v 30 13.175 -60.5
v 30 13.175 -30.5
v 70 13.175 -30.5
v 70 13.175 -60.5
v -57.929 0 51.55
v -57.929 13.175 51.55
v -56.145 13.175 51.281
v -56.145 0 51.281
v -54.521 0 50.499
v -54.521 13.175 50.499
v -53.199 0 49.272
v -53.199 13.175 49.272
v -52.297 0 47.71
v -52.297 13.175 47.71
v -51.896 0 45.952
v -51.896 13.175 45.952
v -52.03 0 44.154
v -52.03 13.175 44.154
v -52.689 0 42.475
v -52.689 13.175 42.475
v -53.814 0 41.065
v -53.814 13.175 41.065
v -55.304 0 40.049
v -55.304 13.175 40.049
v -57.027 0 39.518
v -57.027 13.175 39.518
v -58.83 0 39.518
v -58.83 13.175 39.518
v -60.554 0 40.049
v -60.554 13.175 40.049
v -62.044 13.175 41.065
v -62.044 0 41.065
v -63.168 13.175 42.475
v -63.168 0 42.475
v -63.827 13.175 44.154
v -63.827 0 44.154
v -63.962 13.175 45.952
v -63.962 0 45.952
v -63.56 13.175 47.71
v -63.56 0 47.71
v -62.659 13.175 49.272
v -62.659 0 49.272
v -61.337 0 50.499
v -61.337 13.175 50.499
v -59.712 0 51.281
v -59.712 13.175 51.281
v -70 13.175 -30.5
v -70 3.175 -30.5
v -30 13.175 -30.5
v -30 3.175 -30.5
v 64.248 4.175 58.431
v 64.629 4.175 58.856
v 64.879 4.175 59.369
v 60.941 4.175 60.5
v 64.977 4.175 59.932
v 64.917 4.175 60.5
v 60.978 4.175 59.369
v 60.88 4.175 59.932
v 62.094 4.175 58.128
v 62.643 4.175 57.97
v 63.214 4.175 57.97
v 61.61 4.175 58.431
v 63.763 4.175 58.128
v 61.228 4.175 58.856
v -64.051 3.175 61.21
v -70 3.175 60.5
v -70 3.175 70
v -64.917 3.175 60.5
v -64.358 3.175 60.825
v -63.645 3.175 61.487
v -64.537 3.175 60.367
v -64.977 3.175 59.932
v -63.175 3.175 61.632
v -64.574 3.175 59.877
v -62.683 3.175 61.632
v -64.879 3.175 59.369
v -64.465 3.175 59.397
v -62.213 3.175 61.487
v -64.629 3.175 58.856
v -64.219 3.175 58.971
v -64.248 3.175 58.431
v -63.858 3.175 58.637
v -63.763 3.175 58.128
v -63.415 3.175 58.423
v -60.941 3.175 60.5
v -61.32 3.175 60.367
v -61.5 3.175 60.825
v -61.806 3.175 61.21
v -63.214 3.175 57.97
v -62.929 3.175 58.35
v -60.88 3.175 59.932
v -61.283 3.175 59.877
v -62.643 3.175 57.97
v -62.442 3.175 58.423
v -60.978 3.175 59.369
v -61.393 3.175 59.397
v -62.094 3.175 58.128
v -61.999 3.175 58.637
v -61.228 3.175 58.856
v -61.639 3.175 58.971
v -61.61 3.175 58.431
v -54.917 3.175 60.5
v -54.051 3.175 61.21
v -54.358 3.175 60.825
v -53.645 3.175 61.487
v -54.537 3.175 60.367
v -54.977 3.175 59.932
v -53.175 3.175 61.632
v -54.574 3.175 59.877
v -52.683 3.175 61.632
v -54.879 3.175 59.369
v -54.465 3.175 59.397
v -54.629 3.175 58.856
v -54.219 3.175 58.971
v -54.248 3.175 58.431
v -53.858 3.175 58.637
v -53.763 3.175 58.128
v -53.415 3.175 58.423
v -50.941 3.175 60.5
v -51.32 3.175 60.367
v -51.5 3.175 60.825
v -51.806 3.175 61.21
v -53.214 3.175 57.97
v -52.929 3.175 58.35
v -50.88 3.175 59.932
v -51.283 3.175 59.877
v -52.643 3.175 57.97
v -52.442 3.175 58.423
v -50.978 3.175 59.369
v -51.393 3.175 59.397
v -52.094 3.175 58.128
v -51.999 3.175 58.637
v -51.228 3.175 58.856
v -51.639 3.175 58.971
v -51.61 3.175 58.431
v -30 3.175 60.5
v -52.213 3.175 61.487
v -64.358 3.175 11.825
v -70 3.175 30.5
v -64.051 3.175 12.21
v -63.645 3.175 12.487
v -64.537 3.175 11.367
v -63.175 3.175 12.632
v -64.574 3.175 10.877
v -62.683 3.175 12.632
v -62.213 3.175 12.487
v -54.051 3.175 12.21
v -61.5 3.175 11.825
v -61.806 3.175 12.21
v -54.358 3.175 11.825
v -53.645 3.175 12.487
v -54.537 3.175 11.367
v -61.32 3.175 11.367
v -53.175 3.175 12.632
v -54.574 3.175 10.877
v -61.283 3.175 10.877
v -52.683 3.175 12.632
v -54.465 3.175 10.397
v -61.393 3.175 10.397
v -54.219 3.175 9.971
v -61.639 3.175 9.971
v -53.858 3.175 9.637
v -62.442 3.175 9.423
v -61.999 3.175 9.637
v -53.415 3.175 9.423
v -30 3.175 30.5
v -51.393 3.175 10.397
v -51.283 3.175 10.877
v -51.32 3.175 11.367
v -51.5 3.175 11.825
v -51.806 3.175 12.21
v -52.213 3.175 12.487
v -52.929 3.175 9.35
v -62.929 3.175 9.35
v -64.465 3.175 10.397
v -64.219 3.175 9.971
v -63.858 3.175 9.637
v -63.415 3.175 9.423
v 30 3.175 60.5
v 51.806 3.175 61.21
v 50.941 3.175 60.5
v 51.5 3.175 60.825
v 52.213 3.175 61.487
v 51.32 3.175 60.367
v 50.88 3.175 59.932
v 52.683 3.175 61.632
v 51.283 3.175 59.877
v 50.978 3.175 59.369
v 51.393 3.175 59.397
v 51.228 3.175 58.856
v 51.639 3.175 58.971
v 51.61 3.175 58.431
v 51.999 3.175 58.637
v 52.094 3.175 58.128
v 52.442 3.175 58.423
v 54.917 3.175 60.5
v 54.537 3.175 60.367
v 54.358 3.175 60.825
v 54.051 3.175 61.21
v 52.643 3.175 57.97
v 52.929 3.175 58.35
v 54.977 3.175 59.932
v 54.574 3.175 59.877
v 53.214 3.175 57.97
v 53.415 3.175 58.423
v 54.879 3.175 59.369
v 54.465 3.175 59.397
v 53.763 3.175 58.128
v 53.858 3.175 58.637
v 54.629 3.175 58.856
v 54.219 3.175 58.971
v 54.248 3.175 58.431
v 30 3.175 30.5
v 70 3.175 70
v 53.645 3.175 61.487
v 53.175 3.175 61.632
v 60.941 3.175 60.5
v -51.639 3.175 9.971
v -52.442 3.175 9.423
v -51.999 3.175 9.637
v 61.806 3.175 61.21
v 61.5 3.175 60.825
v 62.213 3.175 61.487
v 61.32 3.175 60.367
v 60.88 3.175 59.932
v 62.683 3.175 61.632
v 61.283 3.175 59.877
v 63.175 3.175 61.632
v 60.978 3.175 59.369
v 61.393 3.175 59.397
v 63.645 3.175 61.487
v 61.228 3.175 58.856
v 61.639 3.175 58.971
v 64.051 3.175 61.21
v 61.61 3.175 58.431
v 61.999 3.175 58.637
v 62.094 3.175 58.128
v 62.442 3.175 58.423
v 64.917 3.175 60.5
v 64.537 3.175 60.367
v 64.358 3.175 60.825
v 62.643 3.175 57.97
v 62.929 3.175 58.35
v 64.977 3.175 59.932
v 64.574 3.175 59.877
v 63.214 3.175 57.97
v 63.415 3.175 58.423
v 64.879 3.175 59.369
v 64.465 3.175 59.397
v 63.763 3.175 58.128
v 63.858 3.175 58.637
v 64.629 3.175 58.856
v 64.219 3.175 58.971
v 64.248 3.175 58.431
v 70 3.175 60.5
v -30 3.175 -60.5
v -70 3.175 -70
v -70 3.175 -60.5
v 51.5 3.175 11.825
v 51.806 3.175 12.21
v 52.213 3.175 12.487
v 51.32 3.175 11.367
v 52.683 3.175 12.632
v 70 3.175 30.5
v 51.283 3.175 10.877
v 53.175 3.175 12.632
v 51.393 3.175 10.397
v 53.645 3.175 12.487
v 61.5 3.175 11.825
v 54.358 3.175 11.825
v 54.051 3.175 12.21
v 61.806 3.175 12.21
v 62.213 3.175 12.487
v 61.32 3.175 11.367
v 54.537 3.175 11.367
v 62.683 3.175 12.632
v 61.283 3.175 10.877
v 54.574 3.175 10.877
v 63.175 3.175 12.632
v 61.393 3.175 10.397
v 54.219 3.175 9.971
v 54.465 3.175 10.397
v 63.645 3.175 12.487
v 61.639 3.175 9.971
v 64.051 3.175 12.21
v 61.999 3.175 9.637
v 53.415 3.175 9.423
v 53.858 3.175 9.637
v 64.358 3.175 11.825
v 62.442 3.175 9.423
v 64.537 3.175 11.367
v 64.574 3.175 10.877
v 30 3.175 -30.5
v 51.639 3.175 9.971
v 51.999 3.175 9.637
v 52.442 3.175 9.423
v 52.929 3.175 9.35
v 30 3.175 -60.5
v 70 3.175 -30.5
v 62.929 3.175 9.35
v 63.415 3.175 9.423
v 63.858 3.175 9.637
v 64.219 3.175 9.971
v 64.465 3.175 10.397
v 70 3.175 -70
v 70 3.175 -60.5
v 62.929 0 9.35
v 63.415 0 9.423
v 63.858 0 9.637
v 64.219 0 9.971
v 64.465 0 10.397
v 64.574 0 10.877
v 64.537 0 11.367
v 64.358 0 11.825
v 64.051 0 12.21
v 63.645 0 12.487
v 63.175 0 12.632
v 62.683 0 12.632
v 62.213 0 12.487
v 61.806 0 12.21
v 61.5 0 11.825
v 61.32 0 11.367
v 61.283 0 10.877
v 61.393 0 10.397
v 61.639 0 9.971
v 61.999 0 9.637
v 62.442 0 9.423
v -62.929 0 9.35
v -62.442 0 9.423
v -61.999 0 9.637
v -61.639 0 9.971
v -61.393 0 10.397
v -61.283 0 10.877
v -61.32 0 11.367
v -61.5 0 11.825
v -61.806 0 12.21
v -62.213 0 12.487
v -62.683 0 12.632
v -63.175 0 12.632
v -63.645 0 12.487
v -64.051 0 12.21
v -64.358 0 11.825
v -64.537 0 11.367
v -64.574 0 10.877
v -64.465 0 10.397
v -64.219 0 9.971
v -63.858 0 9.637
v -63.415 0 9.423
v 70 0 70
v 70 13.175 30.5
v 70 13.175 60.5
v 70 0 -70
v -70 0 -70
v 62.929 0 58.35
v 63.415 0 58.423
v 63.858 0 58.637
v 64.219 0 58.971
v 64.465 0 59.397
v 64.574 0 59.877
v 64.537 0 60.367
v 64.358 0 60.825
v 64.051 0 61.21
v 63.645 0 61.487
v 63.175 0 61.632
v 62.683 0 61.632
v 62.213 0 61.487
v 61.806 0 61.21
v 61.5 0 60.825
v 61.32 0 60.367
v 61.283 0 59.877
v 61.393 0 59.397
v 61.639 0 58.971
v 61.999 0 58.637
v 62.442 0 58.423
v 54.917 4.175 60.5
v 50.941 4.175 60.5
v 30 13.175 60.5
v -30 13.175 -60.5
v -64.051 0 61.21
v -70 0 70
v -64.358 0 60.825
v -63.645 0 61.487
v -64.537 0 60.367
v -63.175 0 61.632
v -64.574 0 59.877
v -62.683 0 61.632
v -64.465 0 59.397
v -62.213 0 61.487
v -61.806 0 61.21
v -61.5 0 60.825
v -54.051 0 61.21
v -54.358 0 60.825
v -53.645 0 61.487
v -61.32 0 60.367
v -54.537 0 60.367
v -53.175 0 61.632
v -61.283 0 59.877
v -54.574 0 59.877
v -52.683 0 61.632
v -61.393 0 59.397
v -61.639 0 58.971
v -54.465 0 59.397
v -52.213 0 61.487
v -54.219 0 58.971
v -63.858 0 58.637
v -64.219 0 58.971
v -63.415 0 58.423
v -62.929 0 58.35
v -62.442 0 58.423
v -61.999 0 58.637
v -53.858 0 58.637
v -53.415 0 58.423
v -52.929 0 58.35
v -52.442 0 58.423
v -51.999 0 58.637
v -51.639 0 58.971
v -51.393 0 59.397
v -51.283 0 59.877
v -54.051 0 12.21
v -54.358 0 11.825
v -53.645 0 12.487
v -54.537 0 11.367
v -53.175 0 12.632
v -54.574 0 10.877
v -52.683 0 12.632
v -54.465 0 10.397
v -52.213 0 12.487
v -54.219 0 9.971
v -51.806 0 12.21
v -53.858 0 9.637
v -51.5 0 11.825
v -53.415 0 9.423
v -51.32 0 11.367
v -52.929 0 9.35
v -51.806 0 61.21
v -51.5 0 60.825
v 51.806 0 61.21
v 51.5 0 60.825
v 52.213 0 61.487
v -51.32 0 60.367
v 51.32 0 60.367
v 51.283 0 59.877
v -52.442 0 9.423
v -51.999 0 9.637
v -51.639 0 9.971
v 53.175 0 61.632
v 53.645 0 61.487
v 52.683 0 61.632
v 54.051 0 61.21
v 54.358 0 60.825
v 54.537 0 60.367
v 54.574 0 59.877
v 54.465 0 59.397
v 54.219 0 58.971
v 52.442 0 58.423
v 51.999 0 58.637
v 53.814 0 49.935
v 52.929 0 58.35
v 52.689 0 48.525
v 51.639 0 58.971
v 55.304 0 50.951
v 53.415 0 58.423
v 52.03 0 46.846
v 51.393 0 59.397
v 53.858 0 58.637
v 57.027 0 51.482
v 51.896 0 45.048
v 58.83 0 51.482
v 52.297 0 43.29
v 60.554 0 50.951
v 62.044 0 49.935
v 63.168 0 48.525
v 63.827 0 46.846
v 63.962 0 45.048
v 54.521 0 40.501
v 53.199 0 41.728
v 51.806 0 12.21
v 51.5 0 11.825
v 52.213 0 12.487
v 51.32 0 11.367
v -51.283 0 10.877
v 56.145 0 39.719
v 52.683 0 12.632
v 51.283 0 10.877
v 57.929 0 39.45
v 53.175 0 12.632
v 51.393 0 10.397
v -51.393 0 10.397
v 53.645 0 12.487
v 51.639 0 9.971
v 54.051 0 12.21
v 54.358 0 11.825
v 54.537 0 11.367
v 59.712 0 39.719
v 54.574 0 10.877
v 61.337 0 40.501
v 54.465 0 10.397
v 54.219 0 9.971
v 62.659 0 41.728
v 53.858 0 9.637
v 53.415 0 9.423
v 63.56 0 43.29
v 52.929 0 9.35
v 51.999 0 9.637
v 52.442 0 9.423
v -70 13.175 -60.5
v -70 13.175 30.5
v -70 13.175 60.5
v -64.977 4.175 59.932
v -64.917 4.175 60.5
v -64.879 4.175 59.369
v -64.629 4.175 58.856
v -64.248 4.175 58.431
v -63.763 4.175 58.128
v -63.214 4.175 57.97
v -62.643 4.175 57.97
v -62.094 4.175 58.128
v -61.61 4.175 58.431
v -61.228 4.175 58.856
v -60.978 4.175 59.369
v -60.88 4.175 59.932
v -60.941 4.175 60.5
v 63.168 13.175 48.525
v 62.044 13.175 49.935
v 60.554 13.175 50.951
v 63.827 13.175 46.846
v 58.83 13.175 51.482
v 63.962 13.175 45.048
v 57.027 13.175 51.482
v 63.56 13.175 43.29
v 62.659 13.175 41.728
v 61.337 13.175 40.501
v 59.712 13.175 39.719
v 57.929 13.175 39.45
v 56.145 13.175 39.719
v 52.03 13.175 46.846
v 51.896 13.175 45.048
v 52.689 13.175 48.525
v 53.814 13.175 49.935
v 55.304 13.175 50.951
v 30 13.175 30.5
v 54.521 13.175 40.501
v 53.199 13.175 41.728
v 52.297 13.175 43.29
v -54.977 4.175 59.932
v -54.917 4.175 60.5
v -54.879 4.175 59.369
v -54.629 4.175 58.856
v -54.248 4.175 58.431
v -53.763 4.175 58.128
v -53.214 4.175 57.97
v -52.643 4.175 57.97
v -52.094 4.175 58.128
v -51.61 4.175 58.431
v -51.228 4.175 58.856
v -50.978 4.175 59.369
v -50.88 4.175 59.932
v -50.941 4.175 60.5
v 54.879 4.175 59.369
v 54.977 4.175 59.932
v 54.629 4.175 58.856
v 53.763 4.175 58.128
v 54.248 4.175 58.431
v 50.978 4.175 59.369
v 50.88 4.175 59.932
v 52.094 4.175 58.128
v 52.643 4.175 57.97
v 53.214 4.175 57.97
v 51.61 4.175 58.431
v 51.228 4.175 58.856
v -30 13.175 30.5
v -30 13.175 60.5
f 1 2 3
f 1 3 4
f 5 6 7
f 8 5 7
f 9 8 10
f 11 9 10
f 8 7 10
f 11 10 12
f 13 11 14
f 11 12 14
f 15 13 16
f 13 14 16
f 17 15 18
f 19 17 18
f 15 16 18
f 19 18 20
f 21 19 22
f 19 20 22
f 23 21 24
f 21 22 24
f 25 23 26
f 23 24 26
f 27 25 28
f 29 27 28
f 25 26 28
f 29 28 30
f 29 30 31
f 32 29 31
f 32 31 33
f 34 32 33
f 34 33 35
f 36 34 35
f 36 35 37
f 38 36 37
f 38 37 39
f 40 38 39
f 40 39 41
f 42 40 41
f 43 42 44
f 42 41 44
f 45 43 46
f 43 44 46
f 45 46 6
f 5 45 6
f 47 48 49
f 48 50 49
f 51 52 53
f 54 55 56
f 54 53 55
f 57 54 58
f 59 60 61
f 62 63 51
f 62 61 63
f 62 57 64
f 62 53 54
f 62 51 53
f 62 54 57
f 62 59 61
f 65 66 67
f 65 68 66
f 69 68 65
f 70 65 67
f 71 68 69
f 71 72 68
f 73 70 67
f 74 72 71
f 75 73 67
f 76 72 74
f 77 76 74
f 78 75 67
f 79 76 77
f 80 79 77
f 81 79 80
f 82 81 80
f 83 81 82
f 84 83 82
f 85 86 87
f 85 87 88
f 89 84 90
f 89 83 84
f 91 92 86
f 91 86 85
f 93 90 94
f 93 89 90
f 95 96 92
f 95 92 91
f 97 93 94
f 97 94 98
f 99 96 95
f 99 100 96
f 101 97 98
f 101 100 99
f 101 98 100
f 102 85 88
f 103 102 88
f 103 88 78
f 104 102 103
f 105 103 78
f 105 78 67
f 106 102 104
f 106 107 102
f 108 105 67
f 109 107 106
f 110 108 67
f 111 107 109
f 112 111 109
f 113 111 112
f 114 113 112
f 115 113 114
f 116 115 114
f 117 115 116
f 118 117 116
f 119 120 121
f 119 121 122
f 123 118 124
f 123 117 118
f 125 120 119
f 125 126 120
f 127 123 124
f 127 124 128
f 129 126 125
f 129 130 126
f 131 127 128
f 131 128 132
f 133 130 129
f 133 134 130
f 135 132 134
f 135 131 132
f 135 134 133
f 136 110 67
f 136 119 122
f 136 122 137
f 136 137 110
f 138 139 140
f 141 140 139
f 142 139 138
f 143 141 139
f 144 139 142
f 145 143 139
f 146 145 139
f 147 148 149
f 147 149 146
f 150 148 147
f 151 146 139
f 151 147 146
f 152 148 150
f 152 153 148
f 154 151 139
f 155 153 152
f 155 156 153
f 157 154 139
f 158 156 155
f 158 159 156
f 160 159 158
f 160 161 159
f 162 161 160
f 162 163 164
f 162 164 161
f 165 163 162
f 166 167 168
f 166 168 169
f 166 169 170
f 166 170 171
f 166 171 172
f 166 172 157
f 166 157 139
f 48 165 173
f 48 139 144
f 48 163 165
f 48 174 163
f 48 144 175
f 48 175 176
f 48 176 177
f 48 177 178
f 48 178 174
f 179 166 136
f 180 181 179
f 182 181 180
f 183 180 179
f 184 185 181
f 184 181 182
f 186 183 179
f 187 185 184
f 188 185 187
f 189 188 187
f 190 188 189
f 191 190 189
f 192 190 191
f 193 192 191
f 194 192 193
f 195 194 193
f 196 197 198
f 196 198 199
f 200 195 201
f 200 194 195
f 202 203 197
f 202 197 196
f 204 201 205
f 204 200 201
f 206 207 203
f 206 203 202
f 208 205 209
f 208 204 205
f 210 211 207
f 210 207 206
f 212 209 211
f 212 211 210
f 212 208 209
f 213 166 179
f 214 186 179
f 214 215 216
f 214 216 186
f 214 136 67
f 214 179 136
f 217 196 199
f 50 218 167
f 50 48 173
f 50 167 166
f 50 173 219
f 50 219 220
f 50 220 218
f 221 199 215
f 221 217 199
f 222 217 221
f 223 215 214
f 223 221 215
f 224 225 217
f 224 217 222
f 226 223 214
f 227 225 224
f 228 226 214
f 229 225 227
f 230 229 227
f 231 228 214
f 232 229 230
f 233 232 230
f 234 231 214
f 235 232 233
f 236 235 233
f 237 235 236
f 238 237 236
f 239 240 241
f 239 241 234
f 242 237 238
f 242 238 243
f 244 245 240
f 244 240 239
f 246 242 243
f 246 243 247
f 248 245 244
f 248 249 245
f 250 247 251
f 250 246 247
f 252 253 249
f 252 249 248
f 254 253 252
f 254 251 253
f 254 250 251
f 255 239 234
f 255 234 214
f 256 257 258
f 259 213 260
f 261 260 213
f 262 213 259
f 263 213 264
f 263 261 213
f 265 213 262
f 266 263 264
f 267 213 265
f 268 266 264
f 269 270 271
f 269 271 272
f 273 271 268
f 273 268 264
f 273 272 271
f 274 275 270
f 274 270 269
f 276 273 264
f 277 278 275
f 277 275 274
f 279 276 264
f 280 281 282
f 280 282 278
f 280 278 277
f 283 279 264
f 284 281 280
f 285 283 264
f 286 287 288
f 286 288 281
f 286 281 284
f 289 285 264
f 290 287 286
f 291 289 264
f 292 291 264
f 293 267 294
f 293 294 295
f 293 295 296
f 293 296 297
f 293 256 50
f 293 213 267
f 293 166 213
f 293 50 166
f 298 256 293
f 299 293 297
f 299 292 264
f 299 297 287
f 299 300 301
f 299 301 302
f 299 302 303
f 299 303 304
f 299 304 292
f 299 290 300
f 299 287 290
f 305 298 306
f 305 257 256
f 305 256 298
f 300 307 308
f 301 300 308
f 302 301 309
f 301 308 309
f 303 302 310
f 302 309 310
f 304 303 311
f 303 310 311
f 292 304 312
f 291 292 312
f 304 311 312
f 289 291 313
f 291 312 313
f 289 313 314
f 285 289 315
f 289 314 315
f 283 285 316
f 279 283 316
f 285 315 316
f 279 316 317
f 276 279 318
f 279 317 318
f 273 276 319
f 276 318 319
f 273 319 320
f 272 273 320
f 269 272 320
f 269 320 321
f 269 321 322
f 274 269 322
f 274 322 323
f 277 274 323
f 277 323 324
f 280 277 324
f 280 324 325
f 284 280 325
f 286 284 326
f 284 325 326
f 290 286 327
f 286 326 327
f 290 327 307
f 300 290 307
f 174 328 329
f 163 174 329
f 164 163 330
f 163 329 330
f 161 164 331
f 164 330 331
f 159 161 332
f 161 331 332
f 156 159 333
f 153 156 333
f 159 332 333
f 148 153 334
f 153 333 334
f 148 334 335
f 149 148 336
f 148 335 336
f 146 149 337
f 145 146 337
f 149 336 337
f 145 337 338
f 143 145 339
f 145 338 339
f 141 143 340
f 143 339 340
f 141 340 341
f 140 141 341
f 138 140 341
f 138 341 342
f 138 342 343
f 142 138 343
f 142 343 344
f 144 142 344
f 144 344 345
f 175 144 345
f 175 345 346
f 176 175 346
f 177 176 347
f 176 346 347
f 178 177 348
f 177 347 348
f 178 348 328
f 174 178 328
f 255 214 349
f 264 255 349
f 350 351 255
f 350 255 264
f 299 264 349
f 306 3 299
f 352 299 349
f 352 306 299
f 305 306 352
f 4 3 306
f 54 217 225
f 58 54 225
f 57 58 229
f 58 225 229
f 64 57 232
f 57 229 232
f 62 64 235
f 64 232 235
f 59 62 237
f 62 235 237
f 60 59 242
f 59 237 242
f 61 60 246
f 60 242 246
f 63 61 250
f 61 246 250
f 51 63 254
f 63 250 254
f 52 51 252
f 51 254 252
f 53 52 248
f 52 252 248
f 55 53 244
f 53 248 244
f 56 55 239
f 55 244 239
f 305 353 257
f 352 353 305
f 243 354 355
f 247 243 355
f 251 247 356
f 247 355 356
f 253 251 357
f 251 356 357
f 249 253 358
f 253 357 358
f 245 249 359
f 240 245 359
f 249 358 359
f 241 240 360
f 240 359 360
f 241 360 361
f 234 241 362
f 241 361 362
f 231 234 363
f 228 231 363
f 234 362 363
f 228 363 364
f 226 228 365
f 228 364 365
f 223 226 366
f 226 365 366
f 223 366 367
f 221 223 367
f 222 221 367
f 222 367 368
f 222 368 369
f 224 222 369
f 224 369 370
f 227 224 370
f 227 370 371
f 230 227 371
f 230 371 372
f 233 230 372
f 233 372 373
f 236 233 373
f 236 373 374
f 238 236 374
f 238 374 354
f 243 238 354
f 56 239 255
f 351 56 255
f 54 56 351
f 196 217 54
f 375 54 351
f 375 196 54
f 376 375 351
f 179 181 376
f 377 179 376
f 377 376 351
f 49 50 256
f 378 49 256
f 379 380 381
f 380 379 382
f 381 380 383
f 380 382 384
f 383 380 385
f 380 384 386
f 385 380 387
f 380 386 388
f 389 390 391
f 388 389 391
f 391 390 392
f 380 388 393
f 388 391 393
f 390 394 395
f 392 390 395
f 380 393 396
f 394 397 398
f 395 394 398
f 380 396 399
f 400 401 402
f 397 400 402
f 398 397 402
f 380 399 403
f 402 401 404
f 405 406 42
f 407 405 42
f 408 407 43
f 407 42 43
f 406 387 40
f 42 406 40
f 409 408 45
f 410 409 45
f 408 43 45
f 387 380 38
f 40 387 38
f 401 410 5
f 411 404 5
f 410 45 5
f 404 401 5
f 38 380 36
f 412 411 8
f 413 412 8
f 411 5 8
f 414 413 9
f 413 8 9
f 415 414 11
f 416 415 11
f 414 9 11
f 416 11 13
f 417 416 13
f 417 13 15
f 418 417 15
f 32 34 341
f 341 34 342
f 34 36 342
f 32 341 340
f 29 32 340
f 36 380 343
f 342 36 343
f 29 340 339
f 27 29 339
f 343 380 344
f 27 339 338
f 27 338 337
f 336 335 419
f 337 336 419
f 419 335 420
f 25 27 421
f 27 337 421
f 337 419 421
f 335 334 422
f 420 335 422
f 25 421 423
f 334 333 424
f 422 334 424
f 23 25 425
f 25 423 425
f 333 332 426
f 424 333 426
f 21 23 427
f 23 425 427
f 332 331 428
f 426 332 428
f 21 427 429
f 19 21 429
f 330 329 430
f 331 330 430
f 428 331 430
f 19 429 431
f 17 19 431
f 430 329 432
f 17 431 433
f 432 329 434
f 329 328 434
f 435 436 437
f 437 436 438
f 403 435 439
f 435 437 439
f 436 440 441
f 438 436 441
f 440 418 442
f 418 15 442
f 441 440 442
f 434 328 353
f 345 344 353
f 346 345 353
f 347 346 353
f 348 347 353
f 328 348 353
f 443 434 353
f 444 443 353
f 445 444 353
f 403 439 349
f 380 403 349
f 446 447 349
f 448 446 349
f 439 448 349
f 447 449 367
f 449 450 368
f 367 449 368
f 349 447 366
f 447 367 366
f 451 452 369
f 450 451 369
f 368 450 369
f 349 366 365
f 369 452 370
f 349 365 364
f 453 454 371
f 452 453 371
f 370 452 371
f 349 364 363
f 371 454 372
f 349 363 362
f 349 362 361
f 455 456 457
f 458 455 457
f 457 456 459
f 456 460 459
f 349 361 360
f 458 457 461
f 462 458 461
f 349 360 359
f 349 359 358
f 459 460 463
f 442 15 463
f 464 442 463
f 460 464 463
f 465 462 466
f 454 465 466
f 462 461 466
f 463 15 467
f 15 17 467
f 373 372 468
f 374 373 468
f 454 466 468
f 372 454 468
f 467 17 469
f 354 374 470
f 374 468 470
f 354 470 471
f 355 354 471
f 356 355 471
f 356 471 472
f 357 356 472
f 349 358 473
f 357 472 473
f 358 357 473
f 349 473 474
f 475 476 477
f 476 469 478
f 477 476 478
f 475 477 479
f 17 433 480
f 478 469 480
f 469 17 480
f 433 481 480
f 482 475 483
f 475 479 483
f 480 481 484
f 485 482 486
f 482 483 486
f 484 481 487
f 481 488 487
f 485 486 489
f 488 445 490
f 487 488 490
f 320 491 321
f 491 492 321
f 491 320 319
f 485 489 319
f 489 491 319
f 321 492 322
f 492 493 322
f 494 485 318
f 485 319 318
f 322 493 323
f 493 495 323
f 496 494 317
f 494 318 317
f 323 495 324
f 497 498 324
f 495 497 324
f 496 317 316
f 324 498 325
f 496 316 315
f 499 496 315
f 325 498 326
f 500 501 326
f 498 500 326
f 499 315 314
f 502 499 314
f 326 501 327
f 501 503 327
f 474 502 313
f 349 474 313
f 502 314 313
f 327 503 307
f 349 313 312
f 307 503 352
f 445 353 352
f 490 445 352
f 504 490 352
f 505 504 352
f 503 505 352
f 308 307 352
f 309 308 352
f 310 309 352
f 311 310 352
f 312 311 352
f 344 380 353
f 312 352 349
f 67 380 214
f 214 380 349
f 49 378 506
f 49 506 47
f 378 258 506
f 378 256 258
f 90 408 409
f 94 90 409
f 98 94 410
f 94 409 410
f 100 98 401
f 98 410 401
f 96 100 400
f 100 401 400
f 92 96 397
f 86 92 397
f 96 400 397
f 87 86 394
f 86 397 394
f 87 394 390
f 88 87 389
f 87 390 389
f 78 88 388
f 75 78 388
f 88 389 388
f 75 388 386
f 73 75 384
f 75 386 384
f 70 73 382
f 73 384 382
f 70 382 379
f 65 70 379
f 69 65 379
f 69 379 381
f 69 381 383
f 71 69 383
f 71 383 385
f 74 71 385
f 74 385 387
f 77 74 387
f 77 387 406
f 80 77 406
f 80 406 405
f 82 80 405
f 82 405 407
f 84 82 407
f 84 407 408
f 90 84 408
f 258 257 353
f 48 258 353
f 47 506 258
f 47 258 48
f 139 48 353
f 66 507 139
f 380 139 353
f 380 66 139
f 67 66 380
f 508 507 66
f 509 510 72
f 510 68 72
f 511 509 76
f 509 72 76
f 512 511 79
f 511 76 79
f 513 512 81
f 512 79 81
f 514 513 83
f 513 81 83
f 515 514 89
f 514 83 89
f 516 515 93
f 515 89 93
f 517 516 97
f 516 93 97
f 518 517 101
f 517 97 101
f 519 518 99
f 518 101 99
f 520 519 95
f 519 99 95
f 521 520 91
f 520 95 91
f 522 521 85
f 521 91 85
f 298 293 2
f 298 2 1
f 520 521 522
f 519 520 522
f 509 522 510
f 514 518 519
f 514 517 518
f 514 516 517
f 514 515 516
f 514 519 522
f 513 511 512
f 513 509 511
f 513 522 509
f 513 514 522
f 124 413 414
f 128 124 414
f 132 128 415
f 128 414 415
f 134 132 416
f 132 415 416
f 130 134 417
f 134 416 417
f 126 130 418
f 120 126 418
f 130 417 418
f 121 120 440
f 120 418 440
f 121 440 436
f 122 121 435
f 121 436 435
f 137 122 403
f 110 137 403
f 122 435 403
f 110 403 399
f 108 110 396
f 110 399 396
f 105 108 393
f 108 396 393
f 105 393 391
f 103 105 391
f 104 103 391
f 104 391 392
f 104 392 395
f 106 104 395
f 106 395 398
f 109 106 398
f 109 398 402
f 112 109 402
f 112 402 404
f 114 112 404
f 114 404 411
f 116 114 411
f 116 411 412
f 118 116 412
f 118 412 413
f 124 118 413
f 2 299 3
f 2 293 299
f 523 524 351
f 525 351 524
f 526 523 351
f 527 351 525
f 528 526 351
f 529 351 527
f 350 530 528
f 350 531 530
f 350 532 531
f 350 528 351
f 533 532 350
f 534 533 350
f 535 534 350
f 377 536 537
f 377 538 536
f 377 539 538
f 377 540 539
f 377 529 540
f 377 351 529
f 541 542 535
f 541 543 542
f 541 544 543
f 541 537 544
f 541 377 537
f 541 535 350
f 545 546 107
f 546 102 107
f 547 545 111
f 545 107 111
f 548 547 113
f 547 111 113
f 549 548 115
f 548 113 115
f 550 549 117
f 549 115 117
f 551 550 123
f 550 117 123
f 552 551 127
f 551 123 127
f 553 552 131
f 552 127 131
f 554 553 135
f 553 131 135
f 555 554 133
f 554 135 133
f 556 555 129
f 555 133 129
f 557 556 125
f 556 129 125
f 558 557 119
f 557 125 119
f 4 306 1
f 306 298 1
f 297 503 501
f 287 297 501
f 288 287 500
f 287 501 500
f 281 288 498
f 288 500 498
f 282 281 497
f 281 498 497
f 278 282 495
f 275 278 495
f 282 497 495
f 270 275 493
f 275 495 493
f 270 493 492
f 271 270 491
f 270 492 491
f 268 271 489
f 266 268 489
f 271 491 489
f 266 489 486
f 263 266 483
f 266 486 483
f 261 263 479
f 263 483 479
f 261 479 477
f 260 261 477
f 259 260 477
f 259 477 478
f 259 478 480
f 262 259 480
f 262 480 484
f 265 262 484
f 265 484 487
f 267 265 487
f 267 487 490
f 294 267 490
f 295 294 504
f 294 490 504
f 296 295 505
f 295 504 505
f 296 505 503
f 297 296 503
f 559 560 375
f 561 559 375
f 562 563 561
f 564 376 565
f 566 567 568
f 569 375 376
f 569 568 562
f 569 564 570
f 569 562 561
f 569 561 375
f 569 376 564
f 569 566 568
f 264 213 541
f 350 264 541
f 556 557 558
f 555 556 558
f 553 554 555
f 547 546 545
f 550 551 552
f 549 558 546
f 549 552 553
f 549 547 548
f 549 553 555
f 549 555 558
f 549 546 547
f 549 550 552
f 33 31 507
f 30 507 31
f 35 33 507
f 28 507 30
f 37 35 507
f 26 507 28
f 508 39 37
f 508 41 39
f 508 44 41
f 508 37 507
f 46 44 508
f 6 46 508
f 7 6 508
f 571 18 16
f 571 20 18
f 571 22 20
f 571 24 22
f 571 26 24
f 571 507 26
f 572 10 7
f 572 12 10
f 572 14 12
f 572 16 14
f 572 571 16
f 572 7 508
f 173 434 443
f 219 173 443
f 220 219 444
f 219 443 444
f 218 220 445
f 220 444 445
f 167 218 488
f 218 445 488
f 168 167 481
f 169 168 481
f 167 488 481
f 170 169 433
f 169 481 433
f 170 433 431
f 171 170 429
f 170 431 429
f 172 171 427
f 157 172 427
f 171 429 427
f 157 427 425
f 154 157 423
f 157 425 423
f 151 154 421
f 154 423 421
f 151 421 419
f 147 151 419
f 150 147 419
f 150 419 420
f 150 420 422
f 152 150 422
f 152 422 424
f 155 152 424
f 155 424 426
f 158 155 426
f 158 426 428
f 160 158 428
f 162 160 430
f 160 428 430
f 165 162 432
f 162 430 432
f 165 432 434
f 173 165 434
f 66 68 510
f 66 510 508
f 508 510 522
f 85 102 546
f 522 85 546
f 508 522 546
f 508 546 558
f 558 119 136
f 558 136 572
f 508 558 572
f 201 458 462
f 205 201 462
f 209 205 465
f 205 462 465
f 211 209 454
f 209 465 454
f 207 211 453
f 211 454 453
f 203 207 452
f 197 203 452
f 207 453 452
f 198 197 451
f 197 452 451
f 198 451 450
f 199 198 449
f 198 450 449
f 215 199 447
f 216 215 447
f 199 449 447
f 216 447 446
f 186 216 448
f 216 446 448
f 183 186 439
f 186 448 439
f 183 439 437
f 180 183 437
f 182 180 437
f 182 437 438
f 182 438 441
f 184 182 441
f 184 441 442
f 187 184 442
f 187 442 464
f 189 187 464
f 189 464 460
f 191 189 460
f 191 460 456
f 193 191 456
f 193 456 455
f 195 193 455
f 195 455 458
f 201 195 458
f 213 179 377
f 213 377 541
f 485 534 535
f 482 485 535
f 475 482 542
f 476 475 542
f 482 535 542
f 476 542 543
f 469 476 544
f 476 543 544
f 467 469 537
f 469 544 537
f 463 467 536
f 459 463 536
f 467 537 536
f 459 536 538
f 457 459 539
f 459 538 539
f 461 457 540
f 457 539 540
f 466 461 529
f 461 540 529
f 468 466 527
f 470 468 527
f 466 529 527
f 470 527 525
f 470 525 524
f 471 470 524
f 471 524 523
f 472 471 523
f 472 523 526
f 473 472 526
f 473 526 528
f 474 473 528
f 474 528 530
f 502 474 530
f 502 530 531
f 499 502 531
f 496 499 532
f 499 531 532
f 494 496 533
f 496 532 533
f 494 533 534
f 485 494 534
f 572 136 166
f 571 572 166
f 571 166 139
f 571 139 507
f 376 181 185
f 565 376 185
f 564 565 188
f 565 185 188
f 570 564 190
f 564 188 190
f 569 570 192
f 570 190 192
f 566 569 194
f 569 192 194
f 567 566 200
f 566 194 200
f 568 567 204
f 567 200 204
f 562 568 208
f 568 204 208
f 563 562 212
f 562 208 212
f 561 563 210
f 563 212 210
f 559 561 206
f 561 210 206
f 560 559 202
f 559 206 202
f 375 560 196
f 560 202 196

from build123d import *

# Parameters (mm, degrees)
SKETCH1_W           = 140
SKETCH1_H           = 140
BOSS_EXTRUDE1_DEPTH = 3.175
SKETCH2_W           = 30
SKETCH2_H           = 30
BOSS_EXTRUDE2_DEPTH = 10
SKETCH11_W          = 30
SKETCH11_H          = 10
BOSS_EXTRUDE3_DEPTH = 10
SKETCH13_W          = 30
SKETCH13_H          = 10
BOSS_EXTRUDE4_DEPTH = 10
SKETCH16_W          = 30
SKETCH16_H          = 10
BOSS_EXTRUDE6_DEPTH = 10
SKETCH17_W          = 30
SKETCH17_H          = 10
BOSS_EXTRUDE7_DEPTH = 10
SKETCH18_R          = 6.05
CUT_EXTRUDE1_DEPTH  = 13.175
SKETCH21_R          = 1.65
CUT_EXTRUDE2_DEPTH  = 3.175
SKETCH22_R          = 2.05
CUT_EXTRUDE3_DEPTH  = 1


with BuildPart() as part:
    # Sketch1 → Boss-Extrude1 (new body)
    with BuildSketch(Plane(origin=(0, 0, 0), x_dir=(1, 0, 0), z_dir=(0, 1, 0))):
        Rectangle(SKETCH1_W, SKETCH1_H)
    extrude(amount=BOSS_EXTRUDE1_DEPTH)

    # Sketch2 → Boss-Extrude2 (add)
    with BuildSketch(Plane(origin=(0, 3.175, 0), x_dir=(1, 0, 0), z_dir=(0, 1, 0))):
        with Locations((45, -45.5)):
            Rectangle(SKETCH2_W, SKETCH2_H)
        with Locations((-45, -45.5)):
            Rectangle(SKETCH2_W, SKETCH2_H)
        with Locations((-45, 45.5)):
            Rectangle(SKETCH2_W, SKETCH2_H)
    boss_extrude2 = extrude(amount=BOSS_EXTRUDE2_DEPTH)

    # Sketch11 → Boss-Extrude3 (add)
    with BuildSketch(Plane.ZY.offset(60)):
        with Locations((45.5, 8.175)):
            Rectangle(SKETCH11_W, SKETCH11_H)
    extrude(amount=BOSS_EXTRUDE3_DEPTH)

    # Sketch13 → Boss-Extrude4 (add)
    with BuildSketch(Plane(origin=(60, 0, 0), x_dir=(0, 0, -1), z_dir=(1, 0, 0))):
        with Locations((-45.5, 8.175)):
            Rectangle(SKETCH13_W, SKETCH13_H)
    extrude(amount=BOSS_EXTRUDE4_DEPTH)

    # Mirror1: Boss-Extrude2 across plane
    add(boss_extrude2.mirror(Plane(origin=(0, 0, 0), x_dir=(0, 0, 1), z_dir=(1, 0, 0))))

    # Sketch16 → Boss-Extrude6 (add)
    with BuildSketch(Plane(origin=(60, 0, 0), x_dir=(0, 0, -1), z_dir=(1, 0, 0))):
        with Locations((45.5, 8.175)):
            Rectangle(SKETCH16_W, SKETCH16_H)
    extrude(amount=BOSS_EXTRUDE6_DEPTH)

    # Sketch17 → Boss-Extrude7 (add)
    with BuildSketch(Plane.ZY.offset(60)):
        with Locations((-45.5, 8.175)):
            Rectangle(SKETCH17_W, SKETCH17_H)
    extrude(amount=BOSS_EXTRUDE7_DEPTH)

    # Sketch18 → Cut-Extrude1 (cut)
    with BuildSketch(Plane(origin=(0, 13.175, 0), x_dir=(1, 0, 0), z_dir=(0, 1, 0))):
        with Locations(Location((-57.9286, -45.5, 0), (0, 0, 270))):
            Circle(SKETCH18_R)
        with Locations(Location((57.9286, -45.5, 0), (0, 0, 90))):
            Circle(SKETCH18_R)
    extrude(amount=-CUT_EXTRUDE1_DEPTH, mode=Mode.SUBTRACT)

    # Sketch21 → Cut-Extrude2 (cut)
    with BuildSketch(Plane(origin=(0, 0, 0), x_dir=(-1, 0, 0), z_dir=(0, -1, 0))):
        with Locations(Location((-62.9286, -11, 0), (0, 0, 90))):
            Circle(SKETCH21_R)
        with Locations(Location((-52.9286, -11, 0), (0, 0, 90))):
            Circle(SKETCH21_R)
        with Locations(Location((-62.9286, -60, 0), (0, 0, 90))):
            Circle(SKETCH21_R)
        with Locations(Location((-52.9286, -60, 0), (0, 0, 90))):
            Circle(SKETCH21_R)
        with Locations(Location((52.9286, -11, 0), (0, 0, 90))):
            Circle(SKETCH21_R)
        with Locations(Location((62.9286, -11, 0), (0, 0, 90))):
            Circle(SKETCH21_R)
        with Locations(Location((52.9286, -60, 0), (0, 0, 90))):
            Circle(SKETCH21_R)
        with Locations(Location((62.9286, -60, 0), (0, 0, 90))):
            Circle(SKETCH21_R)
    extrude(amount=-CUT_EXTRUDE2_DEPTH, mode=Mode.SUBTRACT)

    # Sketch22 → Cut-Extrude3 (cut)
    with BuildSketch(Plane(origin=(0, 3.175, 0), x_dir=(-1, 0, 0), z_dir=(0, -1, 0))):
        with Locations((62.9286, -60)):
            Circle(SKETCH22_R)
        with Locations((52.9286, -60)):
            Circle(SKETCH22_R)
        with Locations((-52.9286, -60)):
            Circle(SKETCH22_R)
        with Locations((-62.9286, -60)):
            Circle(SKETCH22_R)
    extrude(amount=-CUT_EXTRUDE3_DEPTH, mode=Mode.SUBTRACT)


solid = part.part
